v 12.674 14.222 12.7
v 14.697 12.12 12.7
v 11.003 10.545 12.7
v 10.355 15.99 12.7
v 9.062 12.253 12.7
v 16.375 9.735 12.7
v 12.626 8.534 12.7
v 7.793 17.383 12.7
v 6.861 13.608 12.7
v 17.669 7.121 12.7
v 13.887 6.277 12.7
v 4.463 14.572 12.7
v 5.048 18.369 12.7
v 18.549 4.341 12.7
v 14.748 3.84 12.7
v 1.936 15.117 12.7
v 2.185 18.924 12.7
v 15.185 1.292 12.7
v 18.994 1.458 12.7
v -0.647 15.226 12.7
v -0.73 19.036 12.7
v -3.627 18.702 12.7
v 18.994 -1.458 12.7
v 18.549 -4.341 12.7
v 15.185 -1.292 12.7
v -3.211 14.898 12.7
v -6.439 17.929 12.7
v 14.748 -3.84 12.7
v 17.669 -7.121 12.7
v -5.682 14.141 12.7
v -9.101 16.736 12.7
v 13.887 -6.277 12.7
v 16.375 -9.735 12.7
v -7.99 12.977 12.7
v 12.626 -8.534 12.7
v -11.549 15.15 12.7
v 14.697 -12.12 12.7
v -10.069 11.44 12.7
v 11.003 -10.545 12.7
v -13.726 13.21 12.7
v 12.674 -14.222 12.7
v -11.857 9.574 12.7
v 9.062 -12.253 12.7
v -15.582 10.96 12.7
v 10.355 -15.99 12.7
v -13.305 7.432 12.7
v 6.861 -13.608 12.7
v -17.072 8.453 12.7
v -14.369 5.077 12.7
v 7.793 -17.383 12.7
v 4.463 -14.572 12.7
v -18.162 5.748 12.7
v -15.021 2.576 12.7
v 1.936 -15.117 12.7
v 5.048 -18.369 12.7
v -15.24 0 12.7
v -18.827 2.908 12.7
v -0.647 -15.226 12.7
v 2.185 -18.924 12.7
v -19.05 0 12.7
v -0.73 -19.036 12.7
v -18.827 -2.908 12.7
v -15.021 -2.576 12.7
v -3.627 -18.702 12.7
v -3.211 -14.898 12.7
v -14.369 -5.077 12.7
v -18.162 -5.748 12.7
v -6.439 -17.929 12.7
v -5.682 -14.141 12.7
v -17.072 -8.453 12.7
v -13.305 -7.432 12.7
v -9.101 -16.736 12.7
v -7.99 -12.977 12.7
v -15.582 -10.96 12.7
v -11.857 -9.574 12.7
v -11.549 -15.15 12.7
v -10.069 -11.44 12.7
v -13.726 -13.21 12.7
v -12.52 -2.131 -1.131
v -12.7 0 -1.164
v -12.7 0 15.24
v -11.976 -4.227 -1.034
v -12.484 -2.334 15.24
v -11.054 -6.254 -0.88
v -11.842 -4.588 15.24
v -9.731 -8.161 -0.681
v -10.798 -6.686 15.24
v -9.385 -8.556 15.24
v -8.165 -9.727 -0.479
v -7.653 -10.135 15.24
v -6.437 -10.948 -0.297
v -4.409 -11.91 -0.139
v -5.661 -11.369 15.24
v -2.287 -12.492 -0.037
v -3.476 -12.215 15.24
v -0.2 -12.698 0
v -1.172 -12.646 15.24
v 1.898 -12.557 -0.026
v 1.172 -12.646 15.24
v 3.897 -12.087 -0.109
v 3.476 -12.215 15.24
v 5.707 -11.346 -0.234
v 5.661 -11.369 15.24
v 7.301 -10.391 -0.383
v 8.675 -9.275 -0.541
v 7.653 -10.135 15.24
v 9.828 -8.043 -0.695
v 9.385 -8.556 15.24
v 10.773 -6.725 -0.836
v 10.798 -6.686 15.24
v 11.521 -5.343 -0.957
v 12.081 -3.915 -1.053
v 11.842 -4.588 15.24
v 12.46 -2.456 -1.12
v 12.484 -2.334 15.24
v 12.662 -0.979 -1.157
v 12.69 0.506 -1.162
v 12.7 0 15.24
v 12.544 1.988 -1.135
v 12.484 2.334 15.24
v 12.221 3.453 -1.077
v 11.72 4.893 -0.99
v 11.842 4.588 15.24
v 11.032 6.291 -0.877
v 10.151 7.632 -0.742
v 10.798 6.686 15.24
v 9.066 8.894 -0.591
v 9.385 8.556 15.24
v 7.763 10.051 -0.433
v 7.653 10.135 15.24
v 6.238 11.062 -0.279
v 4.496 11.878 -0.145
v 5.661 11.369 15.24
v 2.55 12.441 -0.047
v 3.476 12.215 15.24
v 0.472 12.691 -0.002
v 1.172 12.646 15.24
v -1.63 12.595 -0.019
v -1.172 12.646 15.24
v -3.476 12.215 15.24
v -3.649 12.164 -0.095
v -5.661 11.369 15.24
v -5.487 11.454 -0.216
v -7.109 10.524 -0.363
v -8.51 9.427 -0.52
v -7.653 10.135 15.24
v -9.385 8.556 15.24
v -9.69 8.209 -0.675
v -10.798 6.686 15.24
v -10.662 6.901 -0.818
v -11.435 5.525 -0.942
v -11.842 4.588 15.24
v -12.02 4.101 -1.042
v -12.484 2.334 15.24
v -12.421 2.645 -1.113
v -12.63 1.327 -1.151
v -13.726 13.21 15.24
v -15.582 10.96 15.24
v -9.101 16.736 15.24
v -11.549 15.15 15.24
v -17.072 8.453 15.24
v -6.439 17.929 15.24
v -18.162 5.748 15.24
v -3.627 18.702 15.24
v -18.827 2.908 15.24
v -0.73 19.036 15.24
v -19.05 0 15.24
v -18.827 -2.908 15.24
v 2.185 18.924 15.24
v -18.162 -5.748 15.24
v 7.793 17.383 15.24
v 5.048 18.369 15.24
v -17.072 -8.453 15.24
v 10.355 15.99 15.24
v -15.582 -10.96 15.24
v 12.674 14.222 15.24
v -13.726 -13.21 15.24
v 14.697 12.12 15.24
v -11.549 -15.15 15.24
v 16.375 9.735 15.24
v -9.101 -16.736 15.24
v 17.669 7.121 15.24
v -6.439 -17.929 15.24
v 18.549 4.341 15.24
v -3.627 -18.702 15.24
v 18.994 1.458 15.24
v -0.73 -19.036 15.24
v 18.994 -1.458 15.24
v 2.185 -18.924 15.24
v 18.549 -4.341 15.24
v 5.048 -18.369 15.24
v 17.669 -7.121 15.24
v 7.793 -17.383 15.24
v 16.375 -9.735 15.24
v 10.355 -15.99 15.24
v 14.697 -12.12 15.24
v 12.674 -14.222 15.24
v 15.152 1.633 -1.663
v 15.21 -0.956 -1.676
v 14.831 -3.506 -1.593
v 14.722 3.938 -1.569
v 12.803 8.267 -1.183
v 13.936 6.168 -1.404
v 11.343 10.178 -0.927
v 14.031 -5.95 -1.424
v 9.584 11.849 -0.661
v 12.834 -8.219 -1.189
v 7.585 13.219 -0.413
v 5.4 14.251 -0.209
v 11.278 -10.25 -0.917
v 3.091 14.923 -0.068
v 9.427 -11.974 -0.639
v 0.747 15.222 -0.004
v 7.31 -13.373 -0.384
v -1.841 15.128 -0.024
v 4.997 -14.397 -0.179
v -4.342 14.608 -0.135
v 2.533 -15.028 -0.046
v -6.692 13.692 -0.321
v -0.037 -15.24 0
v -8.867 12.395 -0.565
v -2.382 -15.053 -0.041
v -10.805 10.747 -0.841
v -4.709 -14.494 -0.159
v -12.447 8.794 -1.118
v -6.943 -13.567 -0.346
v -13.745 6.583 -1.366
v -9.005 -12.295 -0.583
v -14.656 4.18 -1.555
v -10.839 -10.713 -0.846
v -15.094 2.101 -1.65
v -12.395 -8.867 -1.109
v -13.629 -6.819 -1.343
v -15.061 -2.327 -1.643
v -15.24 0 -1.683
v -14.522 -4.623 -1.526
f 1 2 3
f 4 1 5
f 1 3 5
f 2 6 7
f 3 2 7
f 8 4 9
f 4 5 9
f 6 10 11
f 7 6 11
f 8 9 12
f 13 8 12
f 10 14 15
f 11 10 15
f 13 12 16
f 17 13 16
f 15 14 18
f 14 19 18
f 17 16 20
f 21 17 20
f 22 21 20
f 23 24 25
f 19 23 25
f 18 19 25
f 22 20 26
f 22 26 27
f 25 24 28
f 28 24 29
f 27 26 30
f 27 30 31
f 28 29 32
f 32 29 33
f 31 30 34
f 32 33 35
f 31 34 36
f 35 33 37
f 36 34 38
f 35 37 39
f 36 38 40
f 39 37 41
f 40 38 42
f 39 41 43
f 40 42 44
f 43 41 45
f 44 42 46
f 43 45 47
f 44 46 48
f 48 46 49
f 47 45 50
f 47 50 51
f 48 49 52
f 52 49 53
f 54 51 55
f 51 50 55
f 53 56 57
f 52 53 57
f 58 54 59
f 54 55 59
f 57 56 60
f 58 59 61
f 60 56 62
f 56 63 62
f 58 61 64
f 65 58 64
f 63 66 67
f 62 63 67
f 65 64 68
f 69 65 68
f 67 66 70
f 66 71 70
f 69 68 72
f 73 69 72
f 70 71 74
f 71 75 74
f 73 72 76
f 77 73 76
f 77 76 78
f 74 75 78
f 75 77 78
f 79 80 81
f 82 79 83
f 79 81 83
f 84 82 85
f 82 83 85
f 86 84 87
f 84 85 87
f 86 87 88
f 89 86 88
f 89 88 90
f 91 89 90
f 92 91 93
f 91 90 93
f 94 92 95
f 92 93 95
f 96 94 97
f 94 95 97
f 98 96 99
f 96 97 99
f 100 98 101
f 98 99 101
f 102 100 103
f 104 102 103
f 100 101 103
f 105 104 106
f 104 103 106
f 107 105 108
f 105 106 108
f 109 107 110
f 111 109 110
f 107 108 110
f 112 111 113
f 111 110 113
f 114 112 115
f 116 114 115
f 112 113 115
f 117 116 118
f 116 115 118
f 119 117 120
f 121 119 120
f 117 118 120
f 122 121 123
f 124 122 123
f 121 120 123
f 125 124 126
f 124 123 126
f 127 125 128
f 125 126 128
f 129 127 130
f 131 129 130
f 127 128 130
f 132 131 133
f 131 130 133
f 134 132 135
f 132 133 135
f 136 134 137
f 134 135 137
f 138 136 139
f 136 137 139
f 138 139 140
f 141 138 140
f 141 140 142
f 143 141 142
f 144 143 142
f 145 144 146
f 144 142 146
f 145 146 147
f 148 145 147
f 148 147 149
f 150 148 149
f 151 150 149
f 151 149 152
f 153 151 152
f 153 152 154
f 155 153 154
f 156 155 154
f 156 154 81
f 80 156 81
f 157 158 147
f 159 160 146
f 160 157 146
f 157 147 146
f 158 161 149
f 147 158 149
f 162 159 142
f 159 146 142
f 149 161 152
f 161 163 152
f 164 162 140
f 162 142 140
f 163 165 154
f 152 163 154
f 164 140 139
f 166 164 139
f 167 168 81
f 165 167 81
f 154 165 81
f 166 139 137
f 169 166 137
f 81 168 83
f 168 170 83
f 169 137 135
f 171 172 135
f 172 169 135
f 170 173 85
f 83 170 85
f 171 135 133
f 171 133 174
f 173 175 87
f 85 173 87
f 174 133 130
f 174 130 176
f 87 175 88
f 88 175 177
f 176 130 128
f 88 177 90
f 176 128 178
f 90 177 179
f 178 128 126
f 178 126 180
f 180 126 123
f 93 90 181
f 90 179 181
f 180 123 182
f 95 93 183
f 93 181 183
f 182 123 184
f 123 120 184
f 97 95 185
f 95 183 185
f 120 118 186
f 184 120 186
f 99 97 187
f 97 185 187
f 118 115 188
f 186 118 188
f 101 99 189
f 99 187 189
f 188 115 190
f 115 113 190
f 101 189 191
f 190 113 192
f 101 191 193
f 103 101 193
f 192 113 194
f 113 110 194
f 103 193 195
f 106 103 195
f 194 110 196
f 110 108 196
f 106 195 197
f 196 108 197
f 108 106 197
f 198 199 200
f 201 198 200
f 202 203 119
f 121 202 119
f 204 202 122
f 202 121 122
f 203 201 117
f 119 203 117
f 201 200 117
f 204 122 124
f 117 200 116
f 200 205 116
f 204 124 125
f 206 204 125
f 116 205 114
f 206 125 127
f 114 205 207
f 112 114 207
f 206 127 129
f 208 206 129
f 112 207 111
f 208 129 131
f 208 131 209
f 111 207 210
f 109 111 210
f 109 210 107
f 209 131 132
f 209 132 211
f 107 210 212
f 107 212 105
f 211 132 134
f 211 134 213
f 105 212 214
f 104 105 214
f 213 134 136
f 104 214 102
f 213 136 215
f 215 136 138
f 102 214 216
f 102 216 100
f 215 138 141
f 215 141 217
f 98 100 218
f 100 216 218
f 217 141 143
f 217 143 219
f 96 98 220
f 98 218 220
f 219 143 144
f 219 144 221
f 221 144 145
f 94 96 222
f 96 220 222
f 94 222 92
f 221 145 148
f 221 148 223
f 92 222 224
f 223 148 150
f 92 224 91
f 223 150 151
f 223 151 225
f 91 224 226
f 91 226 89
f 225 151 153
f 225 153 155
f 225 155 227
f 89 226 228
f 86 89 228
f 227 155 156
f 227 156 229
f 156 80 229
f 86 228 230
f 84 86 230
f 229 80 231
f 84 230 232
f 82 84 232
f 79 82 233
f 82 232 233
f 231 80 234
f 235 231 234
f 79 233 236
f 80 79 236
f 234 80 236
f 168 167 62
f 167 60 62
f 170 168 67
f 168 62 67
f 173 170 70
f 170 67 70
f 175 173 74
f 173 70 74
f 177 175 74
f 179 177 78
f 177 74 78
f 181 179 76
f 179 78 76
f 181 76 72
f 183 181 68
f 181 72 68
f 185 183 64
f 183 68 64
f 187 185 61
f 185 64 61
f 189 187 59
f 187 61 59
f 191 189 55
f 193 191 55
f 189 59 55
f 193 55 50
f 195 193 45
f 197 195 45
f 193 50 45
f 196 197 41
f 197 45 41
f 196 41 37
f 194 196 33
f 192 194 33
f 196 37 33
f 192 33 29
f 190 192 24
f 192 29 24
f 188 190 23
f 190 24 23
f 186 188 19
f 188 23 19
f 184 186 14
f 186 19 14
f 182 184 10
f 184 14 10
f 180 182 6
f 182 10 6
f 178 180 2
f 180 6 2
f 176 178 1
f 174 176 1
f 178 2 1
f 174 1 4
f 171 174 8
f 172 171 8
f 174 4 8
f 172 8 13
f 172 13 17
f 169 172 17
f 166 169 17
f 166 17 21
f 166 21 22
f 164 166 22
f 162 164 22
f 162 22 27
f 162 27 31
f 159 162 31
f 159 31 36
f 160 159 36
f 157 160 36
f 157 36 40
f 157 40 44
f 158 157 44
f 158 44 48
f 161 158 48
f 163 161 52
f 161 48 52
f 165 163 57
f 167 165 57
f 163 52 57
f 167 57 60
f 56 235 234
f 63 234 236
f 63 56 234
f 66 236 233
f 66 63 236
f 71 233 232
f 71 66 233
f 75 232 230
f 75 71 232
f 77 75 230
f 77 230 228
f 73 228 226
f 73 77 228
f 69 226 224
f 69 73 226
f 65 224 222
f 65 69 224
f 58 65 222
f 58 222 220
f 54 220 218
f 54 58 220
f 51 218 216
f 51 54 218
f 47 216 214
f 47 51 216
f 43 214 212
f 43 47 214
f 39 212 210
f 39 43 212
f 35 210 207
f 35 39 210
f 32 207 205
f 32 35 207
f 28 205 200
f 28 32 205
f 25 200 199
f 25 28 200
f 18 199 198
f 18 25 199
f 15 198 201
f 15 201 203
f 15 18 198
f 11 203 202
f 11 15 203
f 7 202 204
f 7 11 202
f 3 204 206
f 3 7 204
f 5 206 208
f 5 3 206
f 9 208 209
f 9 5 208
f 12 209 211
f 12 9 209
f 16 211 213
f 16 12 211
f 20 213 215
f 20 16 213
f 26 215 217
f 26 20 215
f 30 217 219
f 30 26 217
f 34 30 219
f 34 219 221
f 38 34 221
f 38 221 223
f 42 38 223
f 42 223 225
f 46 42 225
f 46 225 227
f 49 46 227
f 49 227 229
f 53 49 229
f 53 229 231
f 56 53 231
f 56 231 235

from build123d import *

# Parameters (mm, degrees)
F0_W          = 2.54
F0_H          = 12.7
F3_DEPTH      = 25.4
F2_R          = 69.85
F4_DEPTH      = 25.4
F4_DEPTH_BACK = 25.4


with BuildPart() as f1:
    # F0 (on Front) → F1 (revolve)
    with BuildSketch(Plane.XZ):
        with Locations((-13.97, 6.35)):
            Rectangle(F0_W, F0_H)
        Polygon((-15.24, 12.7), (-12.7, 12.7), (-12.7, 15.24), (-19.05, 15.24), (-19.05, 12.7), align=None)
    revolve(axis=Axis((0, 0, 10.1733254269), (0, 0, 1)))

    # F3 (add): a face of the model
    f3_faces = [f1.faces().sort_by_distance(p)[0] for p in [
        (14.8089477062, 0, 0),
    ]]
    extrude(f3_faces, amount=F3_DEPTH)

    # F2 (on Front) → F4 (cut, two sides)
    with BuildSketch(Plane.XZ) as f4_sk:
        with Locations((0, -69.85)):
            Circle(F2_R)
    extrude(amount=-F4_DEPTH, mode=Mode.SUBTRACT)
    extrude(f4_sk.sketch, amount=F4_DEPTH_BACK, mode=Mode.SUBTRACT)


solid = f1.part
